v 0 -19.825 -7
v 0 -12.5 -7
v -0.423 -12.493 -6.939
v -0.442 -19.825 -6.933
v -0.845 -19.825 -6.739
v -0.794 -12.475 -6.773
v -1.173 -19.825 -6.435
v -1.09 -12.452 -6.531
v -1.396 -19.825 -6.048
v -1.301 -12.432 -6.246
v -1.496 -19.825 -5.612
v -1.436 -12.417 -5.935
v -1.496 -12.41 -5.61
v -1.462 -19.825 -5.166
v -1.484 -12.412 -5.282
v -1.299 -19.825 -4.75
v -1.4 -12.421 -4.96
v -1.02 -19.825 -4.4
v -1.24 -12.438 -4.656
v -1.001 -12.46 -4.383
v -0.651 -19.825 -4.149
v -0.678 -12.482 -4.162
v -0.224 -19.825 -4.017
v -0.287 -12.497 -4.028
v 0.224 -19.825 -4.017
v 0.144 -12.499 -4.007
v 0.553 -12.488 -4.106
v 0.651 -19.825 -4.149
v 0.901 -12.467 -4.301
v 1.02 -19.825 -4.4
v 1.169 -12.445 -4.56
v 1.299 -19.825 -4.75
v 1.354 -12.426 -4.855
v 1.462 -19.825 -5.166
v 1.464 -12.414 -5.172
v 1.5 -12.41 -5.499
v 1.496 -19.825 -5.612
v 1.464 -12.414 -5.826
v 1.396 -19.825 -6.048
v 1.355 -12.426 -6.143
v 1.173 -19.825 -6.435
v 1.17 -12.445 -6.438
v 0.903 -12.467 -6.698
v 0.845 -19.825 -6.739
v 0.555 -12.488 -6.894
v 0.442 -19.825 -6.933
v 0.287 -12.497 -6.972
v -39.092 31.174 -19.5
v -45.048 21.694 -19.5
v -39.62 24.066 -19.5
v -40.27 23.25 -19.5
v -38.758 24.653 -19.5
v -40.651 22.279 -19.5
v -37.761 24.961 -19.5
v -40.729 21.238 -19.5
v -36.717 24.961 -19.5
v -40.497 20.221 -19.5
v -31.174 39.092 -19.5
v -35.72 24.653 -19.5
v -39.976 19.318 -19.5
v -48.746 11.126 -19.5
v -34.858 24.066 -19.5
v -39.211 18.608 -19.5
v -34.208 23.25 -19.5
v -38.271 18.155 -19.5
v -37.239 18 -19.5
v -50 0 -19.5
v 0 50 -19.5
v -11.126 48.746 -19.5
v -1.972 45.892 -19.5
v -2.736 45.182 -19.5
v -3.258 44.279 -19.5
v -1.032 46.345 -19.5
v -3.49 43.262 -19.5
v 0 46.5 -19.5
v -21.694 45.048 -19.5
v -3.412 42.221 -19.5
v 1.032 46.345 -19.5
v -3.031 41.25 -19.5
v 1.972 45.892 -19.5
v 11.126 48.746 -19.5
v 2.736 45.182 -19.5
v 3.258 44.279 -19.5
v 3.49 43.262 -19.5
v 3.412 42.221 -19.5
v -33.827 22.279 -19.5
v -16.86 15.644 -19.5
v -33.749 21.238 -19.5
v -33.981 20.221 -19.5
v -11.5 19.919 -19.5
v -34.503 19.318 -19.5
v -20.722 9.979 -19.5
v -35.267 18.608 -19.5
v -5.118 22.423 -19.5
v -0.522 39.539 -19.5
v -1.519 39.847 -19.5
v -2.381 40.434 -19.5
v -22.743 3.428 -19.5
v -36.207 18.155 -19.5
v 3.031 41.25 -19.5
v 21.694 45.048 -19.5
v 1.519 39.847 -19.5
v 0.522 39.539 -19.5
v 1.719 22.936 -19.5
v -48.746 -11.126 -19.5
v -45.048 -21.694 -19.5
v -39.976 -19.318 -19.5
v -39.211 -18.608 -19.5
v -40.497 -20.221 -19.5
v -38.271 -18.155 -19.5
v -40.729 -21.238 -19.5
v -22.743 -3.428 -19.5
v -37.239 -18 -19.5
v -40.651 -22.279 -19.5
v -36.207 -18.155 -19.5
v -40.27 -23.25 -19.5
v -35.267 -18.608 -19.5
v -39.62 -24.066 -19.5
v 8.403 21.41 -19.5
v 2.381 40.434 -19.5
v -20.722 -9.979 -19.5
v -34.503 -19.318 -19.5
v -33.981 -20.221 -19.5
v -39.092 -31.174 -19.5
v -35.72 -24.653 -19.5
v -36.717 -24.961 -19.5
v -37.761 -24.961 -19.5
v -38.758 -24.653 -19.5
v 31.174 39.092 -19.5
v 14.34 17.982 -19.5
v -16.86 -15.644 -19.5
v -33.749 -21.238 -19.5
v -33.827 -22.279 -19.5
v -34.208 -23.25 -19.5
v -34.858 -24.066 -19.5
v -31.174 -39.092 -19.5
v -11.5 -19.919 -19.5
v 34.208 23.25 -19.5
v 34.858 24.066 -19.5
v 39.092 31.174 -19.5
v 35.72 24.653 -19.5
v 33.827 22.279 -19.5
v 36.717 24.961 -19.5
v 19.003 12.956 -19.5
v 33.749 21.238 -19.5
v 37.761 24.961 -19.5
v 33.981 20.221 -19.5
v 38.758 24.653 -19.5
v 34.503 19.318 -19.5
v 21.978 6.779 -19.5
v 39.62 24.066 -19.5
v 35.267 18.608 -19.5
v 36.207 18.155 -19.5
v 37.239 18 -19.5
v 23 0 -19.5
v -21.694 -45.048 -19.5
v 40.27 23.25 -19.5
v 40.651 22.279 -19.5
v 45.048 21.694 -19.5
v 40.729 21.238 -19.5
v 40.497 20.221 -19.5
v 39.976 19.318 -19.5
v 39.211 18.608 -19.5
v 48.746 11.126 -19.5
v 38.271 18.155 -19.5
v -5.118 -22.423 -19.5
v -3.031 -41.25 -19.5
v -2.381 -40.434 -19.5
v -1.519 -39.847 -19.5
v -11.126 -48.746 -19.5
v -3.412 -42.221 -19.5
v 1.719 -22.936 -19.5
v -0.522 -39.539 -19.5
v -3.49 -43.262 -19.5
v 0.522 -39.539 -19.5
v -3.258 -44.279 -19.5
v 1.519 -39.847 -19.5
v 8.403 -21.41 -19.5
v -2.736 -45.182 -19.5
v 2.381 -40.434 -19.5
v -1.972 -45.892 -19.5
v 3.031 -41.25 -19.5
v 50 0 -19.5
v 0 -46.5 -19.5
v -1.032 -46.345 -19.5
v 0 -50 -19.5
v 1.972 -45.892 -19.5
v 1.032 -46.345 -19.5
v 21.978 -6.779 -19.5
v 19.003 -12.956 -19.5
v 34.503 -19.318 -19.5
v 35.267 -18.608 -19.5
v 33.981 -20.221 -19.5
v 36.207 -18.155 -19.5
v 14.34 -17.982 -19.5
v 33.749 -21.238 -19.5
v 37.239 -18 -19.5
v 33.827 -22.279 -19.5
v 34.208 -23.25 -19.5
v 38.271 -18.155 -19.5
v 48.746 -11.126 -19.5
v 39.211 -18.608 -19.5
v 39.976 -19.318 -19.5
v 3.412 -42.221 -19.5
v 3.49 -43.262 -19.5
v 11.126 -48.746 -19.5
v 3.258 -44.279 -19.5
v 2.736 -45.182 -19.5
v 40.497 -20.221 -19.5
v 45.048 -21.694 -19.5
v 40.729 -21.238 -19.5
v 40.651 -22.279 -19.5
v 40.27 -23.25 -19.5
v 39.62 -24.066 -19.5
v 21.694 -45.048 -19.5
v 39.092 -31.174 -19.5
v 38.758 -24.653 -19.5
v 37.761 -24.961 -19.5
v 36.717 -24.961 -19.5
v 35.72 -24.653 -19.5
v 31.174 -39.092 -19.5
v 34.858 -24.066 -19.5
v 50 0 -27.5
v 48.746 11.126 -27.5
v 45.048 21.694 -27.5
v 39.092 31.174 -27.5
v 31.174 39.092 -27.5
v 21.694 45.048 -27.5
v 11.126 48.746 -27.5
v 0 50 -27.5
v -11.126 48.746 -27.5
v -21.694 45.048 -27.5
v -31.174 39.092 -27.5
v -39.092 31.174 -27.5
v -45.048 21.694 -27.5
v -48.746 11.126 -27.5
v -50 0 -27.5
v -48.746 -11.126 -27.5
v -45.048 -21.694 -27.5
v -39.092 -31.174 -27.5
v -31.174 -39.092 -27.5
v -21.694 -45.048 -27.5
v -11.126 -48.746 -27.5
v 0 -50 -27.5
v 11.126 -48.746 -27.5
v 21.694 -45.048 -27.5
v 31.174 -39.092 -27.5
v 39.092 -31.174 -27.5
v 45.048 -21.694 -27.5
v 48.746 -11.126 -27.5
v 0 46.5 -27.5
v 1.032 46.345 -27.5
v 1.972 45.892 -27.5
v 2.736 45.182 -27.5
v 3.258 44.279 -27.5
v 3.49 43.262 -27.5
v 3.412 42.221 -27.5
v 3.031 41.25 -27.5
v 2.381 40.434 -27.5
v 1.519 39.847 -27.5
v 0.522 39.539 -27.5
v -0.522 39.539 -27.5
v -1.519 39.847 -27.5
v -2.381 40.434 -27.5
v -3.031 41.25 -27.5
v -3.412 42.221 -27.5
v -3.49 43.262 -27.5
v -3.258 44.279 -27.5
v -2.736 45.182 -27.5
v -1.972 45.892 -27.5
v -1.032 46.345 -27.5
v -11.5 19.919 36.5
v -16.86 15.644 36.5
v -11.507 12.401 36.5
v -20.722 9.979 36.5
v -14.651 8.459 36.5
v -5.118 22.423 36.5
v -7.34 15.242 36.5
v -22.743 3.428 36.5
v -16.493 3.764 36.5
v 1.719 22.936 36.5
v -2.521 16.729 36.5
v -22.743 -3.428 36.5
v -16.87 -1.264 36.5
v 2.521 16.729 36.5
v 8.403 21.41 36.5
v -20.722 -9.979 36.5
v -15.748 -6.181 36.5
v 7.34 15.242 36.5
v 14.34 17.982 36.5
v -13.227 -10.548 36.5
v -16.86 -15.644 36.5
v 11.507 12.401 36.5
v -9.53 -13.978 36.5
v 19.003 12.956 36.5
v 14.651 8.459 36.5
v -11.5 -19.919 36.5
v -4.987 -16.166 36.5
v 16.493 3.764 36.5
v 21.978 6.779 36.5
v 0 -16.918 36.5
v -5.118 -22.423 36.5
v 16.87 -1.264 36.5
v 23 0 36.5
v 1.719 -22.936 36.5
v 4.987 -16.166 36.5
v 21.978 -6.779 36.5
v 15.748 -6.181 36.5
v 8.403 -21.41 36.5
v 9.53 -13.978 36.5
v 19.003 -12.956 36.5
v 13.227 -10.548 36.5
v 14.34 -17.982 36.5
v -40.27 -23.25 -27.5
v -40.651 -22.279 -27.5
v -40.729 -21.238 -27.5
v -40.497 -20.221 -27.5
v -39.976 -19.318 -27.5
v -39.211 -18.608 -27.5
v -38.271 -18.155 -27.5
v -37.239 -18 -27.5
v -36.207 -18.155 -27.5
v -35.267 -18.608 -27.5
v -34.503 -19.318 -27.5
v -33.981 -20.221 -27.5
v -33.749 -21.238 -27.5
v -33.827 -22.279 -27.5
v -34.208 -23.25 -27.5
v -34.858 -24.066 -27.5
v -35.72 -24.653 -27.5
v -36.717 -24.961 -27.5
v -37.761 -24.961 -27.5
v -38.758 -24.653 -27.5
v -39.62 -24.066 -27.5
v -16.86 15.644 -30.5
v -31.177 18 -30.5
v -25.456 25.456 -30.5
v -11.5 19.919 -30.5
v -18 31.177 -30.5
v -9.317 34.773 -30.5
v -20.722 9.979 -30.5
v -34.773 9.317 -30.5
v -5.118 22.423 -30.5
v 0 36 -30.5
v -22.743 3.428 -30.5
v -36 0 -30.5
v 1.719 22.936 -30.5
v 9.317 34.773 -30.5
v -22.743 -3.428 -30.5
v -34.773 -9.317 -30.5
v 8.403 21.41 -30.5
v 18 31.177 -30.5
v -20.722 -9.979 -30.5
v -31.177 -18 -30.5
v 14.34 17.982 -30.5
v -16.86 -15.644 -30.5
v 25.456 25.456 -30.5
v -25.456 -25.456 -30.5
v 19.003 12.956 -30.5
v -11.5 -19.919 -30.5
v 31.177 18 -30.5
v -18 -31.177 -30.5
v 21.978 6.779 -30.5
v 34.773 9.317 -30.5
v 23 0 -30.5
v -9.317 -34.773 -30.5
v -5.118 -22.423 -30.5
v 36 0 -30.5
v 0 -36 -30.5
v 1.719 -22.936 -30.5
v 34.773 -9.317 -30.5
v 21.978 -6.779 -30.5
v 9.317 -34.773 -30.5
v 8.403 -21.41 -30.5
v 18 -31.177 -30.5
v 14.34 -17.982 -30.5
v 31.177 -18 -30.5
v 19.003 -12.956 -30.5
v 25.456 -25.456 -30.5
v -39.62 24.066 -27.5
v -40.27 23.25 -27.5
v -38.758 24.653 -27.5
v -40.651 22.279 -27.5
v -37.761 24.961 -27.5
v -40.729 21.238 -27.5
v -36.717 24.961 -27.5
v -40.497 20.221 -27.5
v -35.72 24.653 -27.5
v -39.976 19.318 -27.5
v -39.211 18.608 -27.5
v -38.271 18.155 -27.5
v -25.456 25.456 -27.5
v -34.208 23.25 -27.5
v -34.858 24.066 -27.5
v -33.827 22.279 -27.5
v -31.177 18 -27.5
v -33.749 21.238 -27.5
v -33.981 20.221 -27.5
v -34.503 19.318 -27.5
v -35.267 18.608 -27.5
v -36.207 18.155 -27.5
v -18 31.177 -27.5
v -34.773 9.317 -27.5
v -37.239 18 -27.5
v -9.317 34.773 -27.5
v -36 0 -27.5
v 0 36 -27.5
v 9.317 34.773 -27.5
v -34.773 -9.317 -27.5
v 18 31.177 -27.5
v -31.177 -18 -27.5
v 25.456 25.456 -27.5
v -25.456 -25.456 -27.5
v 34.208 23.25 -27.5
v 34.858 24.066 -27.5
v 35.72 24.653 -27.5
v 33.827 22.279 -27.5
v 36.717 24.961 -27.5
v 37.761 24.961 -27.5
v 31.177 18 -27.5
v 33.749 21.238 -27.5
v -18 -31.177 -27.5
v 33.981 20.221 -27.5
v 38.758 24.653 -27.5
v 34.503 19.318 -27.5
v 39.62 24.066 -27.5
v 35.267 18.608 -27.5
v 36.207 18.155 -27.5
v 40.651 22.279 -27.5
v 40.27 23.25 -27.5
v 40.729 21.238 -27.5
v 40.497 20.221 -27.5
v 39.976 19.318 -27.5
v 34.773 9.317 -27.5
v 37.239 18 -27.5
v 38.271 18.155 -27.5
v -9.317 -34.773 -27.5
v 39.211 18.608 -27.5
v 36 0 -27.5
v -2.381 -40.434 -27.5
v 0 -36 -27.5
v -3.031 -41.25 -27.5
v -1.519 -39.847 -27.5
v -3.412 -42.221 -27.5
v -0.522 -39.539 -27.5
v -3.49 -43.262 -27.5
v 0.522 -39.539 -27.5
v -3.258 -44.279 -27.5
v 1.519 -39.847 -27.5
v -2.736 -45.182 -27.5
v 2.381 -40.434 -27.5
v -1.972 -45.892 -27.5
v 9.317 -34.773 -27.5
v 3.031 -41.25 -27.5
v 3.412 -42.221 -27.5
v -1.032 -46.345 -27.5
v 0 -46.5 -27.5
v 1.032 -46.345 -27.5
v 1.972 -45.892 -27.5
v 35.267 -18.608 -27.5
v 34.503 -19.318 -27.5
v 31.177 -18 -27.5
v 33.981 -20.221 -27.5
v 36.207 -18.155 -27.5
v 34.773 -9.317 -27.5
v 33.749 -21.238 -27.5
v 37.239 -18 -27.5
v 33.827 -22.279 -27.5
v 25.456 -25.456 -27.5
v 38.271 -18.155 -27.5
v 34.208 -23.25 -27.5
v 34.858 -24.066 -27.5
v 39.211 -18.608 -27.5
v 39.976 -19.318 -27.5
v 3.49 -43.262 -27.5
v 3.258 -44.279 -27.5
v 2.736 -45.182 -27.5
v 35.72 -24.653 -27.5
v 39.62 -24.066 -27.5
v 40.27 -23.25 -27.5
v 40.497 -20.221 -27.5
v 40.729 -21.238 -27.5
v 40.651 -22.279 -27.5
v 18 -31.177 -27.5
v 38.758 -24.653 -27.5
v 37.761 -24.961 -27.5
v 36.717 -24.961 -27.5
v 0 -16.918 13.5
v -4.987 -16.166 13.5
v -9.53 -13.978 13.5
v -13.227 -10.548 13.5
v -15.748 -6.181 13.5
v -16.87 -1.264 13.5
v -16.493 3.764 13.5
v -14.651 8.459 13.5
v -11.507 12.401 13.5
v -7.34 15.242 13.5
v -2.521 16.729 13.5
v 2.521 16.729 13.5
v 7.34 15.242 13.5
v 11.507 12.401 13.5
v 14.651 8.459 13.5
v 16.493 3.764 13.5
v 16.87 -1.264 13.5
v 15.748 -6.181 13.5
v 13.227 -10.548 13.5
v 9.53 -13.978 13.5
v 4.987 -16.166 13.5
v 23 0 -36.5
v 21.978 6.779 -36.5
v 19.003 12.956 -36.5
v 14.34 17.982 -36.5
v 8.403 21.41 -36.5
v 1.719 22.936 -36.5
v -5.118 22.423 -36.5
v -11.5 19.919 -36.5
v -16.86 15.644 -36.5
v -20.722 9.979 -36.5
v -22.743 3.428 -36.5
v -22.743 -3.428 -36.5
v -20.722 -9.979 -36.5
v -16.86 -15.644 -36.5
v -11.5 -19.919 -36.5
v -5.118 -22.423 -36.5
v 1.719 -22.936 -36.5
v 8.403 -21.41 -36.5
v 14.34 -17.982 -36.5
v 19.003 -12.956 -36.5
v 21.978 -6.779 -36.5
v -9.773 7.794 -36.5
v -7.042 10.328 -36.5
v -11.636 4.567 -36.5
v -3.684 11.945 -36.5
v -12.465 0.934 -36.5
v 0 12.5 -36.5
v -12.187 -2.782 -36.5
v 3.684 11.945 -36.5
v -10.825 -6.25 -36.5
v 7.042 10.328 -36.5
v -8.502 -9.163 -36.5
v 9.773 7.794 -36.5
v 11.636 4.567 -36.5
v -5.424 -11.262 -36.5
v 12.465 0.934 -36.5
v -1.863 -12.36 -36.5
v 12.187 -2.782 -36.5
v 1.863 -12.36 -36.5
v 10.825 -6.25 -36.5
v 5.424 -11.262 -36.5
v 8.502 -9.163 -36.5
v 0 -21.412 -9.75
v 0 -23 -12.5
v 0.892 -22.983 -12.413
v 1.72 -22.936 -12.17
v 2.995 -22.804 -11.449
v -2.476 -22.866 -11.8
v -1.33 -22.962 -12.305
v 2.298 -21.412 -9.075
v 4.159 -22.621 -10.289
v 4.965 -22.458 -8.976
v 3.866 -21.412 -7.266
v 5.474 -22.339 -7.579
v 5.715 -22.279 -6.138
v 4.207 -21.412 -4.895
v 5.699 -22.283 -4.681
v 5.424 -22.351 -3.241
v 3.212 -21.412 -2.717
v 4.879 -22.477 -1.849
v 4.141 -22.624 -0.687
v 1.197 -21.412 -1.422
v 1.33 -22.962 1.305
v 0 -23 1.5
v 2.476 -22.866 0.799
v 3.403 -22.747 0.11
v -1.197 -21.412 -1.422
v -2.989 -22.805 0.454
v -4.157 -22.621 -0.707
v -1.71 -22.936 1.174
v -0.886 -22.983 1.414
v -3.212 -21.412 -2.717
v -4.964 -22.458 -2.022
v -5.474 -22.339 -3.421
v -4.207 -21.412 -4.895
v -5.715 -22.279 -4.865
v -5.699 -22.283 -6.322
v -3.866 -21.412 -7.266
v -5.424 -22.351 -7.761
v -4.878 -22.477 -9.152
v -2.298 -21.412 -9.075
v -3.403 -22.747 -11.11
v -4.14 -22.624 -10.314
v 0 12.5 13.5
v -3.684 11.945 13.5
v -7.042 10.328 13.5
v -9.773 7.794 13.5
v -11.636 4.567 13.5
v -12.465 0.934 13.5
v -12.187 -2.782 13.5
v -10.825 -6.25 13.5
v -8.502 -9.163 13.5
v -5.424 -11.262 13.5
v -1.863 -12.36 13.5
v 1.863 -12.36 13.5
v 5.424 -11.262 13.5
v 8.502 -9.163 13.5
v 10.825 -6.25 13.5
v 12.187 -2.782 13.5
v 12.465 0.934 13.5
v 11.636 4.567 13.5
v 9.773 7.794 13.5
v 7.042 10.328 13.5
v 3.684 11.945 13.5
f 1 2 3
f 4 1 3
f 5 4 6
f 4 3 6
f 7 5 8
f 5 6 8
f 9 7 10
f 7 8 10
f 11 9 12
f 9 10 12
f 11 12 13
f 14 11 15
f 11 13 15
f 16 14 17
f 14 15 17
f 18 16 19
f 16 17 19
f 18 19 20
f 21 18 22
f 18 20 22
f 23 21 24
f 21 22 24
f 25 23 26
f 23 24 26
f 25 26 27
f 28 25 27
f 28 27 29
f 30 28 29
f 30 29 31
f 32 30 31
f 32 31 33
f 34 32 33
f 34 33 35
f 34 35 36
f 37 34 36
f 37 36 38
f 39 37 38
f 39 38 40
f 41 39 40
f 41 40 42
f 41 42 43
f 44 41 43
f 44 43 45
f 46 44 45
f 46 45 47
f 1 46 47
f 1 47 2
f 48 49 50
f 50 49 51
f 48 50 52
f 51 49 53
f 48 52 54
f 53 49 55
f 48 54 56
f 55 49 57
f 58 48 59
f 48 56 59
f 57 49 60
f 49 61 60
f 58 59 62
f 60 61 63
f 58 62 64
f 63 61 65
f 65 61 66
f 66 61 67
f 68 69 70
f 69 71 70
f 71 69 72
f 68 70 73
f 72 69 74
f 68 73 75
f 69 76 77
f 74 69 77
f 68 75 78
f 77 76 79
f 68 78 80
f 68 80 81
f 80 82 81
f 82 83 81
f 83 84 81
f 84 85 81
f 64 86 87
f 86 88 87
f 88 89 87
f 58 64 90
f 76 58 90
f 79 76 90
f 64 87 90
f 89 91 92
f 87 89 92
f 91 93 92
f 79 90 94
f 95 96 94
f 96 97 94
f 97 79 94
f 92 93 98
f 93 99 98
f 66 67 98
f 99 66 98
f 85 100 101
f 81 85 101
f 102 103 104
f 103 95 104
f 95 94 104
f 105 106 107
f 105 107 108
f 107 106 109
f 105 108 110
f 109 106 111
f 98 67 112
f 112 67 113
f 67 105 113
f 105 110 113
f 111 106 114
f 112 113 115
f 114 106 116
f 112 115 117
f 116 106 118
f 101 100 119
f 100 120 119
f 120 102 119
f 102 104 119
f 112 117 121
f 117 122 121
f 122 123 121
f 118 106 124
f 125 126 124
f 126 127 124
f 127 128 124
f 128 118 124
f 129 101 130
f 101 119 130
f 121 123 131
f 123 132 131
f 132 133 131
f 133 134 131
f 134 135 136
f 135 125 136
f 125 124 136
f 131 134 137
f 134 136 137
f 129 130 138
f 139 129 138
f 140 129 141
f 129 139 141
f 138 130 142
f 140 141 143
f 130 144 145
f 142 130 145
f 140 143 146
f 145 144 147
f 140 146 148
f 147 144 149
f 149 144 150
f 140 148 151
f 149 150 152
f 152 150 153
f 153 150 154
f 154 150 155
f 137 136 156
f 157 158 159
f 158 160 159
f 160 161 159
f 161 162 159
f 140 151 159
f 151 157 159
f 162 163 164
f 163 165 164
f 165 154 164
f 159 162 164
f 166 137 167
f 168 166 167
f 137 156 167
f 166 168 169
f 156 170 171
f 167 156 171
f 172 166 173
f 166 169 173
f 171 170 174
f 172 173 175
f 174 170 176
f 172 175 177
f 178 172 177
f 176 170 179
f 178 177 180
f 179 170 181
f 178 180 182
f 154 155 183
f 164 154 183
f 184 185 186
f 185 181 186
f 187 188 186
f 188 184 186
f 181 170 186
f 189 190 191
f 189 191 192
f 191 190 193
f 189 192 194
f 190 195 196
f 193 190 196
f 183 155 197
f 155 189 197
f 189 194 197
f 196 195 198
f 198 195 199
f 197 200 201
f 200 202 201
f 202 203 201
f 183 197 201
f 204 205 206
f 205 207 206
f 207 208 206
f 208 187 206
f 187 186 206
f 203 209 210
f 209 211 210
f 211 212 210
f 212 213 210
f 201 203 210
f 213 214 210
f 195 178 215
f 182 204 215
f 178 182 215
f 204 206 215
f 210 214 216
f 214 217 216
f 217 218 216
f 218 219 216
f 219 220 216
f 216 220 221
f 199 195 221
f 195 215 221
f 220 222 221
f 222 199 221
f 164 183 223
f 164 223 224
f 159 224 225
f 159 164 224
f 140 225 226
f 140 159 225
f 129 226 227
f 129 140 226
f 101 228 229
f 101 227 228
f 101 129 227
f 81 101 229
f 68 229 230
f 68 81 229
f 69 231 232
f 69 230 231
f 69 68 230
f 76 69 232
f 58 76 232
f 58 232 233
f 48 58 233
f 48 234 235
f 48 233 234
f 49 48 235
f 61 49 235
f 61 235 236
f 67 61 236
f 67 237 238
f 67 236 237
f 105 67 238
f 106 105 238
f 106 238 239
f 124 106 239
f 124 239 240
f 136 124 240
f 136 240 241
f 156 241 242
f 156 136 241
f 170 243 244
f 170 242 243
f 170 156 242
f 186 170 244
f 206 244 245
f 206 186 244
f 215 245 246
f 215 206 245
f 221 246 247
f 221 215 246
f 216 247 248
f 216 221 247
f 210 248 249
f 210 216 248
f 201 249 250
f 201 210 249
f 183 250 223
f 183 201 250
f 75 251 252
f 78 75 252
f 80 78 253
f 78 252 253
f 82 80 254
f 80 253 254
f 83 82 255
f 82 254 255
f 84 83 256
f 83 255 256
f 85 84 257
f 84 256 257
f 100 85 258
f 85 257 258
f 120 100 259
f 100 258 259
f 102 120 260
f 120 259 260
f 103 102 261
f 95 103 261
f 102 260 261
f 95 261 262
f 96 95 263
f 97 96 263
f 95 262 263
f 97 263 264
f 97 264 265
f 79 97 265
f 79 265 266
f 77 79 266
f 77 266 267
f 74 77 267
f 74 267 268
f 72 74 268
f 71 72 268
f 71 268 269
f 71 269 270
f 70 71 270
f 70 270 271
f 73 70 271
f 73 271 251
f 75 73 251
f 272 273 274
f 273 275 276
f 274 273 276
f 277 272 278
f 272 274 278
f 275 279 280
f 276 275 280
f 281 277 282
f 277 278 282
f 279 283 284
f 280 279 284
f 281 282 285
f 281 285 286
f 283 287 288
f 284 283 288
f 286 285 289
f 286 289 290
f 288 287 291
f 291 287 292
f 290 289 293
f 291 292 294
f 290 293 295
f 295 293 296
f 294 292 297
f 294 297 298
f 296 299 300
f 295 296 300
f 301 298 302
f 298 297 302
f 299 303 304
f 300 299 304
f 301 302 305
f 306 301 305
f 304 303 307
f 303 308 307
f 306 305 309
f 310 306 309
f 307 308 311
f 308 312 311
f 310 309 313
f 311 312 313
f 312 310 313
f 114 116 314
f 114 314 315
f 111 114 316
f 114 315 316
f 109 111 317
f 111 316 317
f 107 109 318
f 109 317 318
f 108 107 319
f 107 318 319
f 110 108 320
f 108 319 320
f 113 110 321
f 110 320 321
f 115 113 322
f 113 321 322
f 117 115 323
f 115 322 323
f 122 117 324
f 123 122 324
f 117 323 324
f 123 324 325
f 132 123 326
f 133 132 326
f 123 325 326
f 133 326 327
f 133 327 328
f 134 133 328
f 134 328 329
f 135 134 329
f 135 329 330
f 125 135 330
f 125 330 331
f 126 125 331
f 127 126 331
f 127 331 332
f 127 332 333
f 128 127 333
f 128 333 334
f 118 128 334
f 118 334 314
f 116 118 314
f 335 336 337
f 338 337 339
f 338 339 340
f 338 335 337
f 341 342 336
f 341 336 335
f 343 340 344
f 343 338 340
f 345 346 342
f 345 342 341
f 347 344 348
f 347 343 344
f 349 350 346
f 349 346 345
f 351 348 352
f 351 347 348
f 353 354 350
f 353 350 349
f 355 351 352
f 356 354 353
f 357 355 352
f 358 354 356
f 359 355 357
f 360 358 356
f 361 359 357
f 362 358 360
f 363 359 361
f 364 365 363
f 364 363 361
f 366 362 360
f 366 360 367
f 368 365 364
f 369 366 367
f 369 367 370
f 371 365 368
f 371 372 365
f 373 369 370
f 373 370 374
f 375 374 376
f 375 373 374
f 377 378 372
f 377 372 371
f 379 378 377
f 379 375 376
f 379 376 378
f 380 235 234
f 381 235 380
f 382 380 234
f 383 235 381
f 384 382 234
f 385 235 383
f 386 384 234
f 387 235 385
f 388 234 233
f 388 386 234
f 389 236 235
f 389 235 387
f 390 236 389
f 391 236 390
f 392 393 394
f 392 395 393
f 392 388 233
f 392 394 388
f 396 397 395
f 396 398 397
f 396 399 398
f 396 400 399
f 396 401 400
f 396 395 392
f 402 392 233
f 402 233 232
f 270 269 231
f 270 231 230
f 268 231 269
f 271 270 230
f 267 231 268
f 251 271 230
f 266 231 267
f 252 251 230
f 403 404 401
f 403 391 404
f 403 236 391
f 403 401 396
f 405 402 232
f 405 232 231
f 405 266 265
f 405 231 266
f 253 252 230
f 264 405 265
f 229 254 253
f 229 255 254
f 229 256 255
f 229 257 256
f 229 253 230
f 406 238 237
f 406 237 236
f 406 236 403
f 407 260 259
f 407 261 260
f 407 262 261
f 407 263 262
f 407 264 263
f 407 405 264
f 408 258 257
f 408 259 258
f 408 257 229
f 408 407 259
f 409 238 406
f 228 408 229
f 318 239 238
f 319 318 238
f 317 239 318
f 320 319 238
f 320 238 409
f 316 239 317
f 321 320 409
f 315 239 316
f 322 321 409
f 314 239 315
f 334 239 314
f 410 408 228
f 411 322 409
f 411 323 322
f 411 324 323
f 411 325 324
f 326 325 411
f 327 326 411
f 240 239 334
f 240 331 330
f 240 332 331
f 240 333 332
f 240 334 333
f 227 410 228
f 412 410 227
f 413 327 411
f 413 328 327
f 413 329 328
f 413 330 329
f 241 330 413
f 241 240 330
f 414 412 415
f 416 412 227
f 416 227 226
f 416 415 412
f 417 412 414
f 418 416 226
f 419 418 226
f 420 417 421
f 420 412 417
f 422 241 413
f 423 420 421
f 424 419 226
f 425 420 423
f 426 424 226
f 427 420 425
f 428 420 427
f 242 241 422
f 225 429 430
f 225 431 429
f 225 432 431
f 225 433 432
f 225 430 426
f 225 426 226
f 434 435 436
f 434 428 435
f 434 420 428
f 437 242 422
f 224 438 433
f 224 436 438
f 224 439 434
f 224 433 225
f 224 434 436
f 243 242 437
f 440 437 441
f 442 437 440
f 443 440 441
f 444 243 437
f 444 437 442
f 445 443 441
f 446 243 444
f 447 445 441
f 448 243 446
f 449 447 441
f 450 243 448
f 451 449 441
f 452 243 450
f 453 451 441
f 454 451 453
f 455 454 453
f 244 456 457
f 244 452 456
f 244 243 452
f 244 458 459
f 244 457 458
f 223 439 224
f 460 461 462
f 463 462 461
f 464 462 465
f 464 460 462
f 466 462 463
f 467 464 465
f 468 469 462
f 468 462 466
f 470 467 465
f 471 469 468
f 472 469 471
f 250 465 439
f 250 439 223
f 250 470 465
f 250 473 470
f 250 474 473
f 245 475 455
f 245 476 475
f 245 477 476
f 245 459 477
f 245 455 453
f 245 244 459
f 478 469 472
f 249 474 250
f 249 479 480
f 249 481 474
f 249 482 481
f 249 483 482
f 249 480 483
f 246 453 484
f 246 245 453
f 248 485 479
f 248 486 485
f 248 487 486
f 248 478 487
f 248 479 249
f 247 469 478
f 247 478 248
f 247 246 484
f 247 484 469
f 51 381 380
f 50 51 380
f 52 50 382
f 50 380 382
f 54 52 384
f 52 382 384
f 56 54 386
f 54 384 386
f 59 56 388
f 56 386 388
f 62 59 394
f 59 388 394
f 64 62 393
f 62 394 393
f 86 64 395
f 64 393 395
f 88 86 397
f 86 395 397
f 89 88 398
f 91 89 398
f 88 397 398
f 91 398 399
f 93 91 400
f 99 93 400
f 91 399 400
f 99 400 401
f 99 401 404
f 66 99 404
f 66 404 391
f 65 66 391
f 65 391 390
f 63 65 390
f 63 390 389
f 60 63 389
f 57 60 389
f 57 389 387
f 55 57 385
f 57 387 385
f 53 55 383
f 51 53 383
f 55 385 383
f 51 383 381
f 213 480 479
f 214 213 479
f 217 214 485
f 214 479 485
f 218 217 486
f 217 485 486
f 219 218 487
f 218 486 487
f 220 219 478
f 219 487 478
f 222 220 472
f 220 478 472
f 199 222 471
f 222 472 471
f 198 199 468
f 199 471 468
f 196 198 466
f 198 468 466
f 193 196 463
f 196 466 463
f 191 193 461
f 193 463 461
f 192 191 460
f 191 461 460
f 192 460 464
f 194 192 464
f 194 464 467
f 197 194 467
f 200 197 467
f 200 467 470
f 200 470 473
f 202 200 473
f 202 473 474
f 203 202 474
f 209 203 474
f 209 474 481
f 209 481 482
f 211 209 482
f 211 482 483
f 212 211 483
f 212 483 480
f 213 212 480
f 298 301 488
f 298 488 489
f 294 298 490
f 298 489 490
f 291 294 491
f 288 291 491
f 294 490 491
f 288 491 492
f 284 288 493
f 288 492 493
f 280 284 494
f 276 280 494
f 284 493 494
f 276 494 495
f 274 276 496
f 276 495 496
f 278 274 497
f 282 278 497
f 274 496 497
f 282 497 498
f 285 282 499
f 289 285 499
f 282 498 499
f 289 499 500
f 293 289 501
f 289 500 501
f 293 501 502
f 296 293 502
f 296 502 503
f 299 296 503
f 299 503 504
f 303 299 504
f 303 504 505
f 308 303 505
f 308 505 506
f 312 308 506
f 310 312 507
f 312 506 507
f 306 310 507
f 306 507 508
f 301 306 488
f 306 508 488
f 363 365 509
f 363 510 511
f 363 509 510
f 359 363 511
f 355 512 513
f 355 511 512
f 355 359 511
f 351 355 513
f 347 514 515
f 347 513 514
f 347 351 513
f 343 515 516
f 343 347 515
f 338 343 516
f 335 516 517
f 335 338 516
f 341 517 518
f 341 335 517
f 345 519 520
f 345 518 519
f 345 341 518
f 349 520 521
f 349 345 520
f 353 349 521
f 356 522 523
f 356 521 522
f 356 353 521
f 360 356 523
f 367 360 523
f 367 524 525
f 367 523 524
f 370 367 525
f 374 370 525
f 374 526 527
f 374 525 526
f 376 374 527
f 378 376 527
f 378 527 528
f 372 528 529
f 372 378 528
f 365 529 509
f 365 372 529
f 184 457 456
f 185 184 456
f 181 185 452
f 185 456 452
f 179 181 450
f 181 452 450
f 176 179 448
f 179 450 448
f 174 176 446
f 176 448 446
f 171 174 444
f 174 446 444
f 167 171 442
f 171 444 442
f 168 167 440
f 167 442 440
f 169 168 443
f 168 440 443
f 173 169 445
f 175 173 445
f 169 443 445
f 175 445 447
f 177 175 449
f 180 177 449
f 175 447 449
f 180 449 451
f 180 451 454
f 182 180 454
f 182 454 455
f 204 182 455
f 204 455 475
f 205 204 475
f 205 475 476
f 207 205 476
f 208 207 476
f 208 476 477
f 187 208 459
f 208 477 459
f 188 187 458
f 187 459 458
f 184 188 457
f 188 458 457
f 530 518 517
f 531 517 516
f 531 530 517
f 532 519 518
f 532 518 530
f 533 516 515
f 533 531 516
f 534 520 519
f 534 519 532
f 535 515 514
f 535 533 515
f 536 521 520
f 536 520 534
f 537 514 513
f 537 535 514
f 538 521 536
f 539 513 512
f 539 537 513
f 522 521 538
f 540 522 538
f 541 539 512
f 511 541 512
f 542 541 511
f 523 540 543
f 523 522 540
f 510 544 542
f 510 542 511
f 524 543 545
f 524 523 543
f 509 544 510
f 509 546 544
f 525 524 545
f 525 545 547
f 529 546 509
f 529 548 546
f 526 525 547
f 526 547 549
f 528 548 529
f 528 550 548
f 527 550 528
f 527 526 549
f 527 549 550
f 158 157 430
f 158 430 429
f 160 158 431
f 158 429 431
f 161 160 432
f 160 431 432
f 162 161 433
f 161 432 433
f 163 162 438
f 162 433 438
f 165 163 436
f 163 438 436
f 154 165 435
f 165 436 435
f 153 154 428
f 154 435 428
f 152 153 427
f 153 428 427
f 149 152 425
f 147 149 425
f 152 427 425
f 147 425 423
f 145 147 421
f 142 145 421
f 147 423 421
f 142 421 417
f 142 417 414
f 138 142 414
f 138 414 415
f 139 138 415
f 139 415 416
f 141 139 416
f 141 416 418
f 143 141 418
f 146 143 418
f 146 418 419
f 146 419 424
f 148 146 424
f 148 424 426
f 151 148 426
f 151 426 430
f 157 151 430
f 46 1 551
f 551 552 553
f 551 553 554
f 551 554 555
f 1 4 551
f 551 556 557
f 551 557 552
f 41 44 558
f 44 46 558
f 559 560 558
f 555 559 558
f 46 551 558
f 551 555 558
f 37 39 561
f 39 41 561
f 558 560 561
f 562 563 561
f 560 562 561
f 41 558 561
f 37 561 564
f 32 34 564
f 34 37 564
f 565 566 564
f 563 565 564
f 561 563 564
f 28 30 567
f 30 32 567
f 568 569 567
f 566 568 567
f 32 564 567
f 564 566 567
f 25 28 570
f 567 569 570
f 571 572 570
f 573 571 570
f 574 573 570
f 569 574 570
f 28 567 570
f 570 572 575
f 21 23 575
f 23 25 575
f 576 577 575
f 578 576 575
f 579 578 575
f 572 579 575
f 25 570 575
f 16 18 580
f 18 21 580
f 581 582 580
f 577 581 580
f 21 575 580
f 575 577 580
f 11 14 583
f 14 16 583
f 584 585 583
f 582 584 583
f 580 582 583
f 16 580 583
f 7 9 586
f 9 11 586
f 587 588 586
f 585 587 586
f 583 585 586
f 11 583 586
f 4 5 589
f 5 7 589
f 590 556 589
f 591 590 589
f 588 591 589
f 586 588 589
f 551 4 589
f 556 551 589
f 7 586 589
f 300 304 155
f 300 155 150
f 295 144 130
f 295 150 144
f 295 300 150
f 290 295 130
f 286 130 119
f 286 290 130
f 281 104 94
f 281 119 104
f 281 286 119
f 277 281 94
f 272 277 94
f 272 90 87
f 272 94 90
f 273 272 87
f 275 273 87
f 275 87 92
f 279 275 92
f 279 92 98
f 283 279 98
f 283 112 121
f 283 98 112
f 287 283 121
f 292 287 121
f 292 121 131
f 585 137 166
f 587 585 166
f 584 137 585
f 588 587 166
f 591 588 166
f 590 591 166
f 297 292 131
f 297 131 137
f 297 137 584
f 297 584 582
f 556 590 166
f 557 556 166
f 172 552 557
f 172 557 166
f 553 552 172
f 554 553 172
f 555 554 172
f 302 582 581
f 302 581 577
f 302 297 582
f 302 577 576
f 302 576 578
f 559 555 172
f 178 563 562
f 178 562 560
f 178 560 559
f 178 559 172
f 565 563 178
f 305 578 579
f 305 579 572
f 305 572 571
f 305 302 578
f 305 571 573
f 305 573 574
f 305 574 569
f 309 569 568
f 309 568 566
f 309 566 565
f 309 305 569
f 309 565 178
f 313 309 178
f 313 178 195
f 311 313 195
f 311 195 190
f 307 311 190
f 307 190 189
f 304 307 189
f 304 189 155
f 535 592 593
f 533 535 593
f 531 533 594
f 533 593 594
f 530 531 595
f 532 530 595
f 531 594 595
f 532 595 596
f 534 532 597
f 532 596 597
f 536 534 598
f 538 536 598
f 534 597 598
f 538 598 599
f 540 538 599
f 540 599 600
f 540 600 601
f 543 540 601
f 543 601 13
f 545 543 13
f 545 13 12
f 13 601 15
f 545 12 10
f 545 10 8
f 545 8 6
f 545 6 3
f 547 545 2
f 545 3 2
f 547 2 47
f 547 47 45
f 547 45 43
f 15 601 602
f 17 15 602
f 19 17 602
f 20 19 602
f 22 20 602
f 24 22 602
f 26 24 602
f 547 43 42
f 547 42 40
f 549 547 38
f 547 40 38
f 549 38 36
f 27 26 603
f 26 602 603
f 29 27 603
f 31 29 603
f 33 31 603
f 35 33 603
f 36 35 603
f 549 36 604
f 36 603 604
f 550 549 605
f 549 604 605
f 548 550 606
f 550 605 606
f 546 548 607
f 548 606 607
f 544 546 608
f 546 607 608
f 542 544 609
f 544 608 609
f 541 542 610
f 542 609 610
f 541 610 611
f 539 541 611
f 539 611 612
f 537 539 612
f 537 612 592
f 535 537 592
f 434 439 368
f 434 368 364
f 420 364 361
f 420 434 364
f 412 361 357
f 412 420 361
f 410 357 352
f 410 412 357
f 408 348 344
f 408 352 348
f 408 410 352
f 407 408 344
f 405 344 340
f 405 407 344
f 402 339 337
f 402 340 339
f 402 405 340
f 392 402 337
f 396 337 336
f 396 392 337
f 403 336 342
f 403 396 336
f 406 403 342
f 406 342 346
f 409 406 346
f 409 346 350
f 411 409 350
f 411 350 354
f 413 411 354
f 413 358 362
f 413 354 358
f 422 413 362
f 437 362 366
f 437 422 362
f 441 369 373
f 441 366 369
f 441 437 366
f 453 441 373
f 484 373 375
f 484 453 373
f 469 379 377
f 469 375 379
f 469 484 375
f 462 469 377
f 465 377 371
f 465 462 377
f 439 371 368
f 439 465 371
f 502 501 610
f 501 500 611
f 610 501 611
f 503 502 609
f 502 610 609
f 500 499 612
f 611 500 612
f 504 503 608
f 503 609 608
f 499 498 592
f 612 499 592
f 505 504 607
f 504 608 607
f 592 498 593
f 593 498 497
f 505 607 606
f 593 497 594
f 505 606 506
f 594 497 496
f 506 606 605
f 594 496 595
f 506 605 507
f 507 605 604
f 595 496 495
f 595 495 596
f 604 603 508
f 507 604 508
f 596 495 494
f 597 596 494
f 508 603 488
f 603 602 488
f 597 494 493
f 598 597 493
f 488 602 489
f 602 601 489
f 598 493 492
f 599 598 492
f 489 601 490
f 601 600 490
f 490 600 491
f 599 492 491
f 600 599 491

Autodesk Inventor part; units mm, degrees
ref_plane "YZ Plane" through (0, 0, 0) normal (1, 0, 0) x (0, 1, 0)
ref_plane "XY Plane" through (0, 0, 0) normal (0, 0, 1) x (1, 0, 0)
sketch "Sketch1" plane through (0, 0, 0) normal (0, 1, 0) x (-1, 0, 0)
  line L0 (0, -36.5) -> (-23, -36.5)
  line L1 (-23, -36.5) -> (-23, 36.5)
  line L2 (-23, 36.5) -> (0, 36.5)
  line L3 (0, 36.5) -> (0, -36.5)
  line L4 (-23, -30.5) -> (-36, -30.5)
  line L5 (-36, -30.5) -> (-36, -27.5)
  line L6 (-36, -27.5) -> (-50, -27.5)
  line L7 (-50, -27.5) -> (-50, -19.5)
  line L8 (-50, -19.5) -> (-23, -19.5)
  point P0 (0, 0)
  point P1 (0, 0)
  dimension "d0" = 73
  dimension "d1" = 46
  dimension "d2" = 72
  dimension "d3" = 100
  dimension "d5" = 3
  dimension "d6" = 8
  dimension "d41" = 9
revolve "Revolution1" add sketch "Sketch1" angle 360 about axis through (0, 0, 36.5) along (0, 0, -1)
sketch "Sketch2" plane through (0, 0, -36.5) normal (0, 0, -1) x (-1, 0, 0)
  point P0 (0, 0)
hole "Hole1" at (0, 0, -36.5) direction (0, 0, 1) diameter 25 end through all
sketch "Sketch3" plane through (0, 0, 36.5) normal (0, 0, 1) x (1, 0, 0)
  point P0 (0, 0)
hole "Hole2" at (0, 0, 36.5) direction (0, 0, -1) diameter 33.835 depth 23 thread size "M36x2" class "6H" standard "ISO Metric profile"
ref_plane "Work Plane1" through (0, -23, 8.5) normal (0, 1, 0) x (-1, 0, 0)
sketch "Sketch4" plane through (0, -23, 8.5) normal (0, 1, 0) x (-1, 0, 0)
  line L0 (23, 28) -> (-23, 28) construction
  point P0 (0, -8.5)
  point P1 (0, -14)
  dimension "d22" = 42
hole "Hole3" at (0, -23, -5.5) direction (0, 1, 0) diameter 3 end up to surface countersink diameter 14 countersink angle 120
sketch "Sketch5" plane through (0, 0, -19.5) normal (0, 0, 1) x (1, 0, 0)
  circle A0 centre (0, 0) radius 12.5 projected
  circle A1 centre (0, 0) radius 43 construction
  point P0 (0, 0)
  point P1 (0, -43)
  dimension "d30" = 86
hole "Hole4" at (0, -43, -19.5) direction (0, 0, -1) diameter 7 end through all
pattern_circular "Circular Pattern1" count 6 over 360 about axis through (0, 0, -10) along (0, 0, 1) of "Hole4"
properties material "Aluminum 6061"
